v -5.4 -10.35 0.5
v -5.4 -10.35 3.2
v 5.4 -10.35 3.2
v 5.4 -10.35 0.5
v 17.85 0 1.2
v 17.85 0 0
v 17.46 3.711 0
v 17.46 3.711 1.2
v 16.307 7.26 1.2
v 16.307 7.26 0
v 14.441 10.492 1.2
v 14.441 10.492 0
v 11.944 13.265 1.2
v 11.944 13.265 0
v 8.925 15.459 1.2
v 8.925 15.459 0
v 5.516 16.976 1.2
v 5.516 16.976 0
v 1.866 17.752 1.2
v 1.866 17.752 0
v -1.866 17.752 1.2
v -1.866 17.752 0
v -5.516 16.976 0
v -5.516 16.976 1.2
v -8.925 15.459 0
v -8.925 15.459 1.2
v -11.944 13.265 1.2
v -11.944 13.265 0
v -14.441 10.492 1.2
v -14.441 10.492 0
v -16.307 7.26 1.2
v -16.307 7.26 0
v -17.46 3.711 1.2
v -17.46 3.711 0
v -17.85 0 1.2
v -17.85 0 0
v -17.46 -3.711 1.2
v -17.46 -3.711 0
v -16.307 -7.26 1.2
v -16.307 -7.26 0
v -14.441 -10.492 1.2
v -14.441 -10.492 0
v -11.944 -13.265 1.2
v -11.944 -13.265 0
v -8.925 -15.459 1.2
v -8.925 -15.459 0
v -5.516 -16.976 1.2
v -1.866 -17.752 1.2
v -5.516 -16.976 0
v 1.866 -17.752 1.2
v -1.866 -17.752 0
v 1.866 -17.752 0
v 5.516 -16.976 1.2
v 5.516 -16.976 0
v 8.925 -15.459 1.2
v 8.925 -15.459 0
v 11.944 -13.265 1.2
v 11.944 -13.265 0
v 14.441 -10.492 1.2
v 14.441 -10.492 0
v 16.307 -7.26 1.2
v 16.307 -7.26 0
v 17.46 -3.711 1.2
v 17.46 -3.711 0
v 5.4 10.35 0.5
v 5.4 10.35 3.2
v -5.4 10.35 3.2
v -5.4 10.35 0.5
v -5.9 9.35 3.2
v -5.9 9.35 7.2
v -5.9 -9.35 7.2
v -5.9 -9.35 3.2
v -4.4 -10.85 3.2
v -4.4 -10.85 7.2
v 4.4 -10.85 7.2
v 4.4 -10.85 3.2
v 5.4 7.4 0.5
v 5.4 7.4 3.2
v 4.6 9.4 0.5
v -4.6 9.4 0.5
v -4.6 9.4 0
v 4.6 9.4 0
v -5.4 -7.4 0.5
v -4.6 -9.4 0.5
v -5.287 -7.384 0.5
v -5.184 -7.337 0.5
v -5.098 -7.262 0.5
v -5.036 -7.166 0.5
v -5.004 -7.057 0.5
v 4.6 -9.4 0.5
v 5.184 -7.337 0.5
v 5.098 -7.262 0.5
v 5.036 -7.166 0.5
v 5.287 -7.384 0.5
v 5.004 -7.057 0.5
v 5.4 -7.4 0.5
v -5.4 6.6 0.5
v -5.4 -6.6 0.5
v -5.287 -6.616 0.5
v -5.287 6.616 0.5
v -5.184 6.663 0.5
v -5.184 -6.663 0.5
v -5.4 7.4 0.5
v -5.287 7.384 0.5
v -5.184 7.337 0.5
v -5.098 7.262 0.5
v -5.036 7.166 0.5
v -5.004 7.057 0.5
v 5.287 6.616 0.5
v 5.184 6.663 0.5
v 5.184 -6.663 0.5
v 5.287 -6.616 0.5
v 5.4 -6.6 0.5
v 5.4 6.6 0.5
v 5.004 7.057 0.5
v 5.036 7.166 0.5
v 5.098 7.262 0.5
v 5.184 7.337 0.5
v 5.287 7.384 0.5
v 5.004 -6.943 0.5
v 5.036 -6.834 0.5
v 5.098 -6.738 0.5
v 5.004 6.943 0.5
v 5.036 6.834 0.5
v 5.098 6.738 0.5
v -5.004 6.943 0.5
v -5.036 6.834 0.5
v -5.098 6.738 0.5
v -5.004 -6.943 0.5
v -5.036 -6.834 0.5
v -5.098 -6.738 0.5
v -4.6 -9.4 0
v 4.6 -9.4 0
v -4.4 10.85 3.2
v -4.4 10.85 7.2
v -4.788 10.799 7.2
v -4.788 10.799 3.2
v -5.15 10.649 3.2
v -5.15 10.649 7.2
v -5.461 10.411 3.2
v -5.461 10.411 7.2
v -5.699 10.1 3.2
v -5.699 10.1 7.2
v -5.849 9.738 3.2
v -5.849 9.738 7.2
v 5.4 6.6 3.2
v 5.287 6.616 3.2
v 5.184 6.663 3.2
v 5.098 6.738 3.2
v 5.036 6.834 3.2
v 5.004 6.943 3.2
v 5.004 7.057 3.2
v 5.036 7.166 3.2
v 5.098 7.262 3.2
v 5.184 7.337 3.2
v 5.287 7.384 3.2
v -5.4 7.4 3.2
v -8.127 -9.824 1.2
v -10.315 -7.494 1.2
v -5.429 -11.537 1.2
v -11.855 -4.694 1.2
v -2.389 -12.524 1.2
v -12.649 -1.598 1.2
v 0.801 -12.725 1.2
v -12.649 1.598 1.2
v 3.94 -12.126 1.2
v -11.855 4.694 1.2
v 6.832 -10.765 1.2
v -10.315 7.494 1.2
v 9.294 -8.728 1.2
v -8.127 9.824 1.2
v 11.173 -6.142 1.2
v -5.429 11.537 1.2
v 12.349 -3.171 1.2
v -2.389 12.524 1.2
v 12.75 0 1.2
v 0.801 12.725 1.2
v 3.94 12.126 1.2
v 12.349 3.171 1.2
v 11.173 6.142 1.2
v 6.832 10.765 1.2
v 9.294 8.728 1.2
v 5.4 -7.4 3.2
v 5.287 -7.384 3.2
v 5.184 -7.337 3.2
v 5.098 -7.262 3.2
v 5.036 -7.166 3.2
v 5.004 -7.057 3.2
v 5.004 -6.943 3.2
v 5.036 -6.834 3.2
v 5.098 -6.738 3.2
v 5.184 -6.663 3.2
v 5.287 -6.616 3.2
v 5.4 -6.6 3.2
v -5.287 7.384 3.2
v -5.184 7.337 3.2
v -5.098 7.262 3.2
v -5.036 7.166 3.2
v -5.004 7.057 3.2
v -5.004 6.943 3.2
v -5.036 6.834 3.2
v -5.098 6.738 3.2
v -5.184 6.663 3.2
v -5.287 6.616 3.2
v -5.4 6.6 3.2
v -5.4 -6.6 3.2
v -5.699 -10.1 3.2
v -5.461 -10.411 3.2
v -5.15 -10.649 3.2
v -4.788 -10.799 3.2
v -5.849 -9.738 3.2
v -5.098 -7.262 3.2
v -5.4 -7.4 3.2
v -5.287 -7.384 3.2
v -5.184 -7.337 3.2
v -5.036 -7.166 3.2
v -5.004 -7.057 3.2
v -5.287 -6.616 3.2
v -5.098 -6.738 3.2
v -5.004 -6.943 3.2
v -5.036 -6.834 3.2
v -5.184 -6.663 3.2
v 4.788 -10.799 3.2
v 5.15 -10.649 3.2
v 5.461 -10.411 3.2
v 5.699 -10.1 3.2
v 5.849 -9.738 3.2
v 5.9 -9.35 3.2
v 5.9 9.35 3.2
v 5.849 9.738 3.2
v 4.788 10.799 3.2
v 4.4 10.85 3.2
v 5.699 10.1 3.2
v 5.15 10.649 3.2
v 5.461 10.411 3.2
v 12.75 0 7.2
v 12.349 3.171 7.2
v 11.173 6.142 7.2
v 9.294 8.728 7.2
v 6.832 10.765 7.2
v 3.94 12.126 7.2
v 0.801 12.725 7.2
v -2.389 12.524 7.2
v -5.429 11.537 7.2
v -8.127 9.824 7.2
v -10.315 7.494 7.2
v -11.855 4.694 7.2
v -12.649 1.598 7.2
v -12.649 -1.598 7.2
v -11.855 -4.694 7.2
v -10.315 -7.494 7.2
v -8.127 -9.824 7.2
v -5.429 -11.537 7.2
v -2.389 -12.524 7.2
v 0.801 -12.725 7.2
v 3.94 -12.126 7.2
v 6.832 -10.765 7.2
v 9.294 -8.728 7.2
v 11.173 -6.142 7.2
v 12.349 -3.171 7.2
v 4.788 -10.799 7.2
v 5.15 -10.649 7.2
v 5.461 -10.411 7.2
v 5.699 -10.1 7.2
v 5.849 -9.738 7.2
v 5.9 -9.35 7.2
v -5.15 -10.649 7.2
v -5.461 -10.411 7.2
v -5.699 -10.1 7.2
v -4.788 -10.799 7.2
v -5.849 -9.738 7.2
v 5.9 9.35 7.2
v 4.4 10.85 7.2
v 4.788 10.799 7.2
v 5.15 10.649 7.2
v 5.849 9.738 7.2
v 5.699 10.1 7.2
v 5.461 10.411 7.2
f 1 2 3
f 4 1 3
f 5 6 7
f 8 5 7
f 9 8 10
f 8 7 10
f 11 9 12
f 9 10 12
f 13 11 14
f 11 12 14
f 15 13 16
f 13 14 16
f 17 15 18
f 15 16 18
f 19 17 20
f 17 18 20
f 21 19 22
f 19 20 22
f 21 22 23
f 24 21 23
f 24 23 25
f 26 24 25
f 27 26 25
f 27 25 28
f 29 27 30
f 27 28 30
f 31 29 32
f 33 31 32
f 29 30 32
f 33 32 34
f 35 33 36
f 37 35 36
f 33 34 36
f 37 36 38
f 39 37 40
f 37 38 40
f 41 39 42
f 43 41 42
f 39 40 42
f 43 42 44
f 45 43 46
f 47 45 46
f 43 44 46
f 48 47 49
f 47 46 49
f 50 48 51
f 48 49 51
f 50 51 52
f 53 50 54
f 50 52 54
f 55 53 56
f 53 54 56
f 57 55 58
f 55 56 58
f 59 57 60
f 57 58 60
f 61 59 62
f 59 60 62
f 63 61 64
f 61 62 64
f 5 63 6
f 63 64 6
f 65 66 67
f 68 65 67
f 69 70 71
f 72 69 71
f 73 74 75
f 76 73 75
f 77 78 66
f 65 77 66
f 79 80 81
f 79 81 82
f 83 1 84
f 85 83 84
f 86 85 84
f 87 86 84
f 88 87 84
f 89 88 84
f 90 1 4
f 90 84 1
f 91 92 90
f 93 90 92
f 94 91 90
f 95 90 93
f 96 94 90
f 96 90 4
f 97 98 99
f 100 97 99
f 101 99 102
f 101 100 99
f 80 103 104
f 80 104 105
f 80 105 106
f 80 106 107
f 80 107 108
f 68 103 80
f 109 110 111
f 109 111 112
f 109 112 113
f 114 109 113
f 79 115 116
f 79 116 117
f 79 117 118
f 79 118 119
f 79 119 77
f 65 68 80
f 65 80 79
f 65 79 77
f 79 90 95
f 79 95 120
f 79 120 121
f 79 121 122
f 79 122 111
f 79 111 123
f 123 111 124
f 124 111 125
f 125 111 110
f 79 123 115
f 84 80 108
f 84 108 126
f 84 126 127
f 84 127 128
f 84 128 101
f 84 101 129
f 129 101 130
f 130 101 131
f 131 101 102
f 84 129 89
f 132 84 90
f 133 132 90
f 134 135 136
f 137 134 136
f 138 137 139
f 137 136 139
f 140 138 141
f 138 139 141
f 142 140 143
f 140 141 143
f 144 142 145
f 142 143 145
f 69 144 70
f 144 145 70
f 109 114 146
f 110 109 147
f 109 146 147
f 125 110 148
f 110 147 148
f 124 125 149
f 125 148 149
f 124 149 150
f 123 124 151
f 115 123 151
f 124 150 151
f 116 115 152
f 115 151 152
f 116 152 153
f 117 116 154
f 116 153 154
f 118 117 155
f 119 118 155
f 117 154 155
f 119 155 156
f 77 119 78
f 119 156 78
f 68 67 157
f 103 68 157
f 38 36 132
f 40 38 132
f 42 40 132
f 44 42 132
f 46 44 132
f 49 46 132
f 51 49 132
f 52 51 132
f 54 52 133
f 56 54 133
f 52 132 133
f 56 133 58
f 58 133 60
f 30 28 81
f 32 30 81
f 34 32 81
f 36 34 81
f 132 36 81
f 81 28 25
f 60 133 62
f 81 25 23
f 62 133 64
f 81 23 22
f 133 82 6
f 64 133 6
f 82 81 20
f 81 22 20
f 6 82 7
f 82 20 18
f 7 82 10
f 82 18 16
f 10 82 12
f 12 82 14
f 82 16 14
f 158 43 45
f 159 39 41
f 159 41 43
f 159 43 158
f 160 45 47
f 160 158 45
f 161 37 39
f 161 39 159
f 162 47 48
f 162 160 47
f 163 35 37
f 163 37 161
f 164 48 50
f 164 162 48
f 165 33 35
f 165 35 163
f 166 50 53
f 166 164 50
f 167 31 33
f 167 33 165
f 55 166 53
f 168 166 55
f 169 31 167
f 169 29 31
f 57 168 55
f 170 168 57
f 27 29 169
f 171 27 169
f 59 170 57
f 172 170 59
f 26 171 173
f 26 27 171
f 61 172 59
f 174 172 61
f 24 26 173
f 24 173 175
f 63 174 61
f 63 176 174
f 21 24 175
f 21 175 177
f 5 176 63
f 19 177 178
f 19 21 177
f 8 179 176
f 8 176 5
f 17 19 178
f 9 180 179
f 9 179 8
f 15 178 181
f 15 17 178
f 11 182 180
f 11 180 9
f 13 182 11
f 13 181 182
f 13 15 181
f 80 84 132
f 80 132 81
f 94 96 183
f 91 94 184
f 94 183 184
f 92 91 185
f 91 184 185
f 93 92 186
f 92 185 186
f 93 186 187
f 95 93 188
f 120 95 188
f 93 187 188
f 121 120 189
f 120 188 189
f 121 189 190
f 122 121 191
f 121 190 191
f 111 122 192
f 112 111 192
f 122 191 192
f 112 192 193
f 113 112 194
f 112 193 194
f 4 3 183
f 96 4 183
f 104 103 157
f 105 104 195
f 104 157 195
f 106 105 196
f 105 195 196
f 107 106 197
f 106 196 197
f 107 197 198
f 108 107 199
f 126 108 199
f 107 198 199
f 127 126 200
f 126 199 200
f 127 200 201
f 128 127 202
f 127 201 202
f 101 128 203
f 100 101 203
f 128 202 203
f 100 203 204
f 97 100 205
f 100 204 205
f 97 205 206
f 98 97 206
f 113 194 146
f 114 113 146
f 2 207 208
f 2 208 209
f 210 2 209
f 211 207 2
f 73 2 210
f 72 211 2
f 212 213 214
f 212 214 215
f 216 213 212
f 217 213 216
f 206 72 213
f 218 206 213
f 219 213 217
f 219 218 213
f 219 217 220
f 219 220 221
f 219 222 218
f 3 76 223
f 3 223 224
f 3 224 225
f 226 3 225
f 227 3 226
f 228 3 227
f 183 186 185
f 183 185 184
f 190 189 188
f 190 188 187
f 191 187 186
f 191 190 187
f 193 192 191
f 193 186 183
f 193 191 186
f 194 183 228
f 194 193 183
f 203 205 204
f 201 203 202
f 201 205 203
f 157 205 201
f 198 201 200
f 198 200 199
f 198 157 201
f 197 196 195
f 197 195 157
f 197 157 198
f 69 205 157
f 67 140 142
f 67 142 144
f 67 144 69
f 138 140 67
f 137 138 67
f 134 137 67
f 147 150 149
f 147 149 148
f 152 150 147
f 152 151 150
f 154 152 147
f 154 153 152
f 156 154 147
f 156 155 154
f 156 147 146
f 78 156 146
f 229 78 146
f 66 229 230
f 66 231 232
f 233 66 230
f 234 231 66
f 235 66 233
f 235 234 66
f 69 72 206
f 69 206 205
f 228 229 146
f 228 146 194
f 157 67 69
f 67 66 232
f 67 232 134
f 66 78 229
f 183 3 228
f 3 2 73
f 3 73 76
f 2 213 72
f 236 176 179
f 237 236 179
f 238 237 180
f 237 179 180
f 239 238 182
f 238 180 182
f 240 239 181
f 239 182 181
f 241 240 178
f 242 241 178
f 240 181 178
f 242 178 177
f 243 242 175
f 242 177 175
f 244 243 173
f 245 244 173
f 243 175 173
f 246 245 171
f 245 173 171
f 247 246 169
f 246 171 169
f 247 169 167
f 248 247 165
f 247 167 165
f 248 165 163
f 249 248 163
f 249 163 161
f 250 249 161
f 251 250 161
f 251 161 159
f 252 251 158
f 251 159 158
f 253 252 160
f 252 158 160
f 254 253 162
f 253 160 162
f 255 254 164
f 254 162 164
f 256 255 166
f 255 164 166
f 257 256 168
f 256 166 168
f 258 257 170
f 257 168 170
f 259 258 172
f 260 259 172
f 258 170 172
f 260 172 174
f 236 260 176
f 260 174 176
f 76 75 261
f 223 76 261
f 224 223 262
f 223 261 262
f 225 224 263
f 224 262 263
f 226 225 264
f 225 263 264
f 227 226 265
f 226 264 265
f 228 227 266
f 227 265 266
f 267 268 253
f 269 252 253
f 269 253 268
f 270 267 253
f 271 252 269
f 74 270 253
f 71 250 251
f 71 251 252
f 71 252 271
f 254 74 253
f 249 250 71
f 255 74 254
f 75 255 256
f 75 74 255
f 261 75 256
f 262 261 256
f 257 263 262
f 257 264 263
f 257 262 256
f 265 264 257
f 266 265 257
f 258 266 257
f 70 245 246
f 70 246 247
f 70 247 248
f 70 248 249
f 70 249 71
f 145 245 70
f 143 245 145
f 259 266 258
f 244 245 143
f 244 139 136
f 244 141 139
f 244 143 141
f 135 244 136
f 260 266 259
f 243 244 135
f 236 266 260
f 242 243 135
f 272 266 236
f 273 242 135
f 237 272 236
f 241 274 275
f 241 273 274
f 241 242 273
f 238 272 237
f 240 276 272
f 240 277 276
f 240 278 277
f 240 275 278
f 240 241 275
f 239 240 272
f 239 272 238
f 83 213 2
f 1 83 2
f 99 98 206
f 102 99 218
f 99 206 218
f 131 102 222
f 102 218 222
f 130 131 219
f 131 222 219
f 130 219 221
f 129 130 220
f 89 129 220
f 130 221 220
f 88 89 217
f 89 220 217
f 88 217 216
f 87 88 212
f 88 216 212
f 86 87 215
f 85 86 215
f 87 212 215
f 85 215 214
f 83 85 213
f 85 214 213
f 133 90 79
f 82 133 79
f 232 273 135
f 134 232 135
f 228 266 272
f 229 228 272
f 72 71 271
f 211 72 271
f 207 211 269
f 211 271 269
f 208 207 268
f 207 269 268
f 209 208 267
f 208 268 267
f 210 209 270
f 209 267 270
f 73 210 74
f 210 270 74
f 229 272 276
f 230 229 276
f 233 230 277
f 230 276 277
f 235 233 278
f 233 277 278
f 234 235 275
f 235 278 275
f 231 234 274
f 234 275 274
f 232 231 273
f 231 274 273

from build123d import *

# Parameters (mm, degrees)
F0_R     = 17.85
F1_DEPTH = 1.2
F2_R     = 12.75
F3_DEPTH = 6
F4_W     = 9.2
F4_H     = 18.8
F5_DEPTH = 7.201
F7_DEPTH = 6.7
F9_DEPTH = 4


with BuildPart() as f1:
    # F0 (on Top) → F1 (new body)
    with BuildSketch(Plane.XY):
        Circle(F0_R)
    extrude(amount=F1_DEPTH)

    # F2 (on face) → F3 (join)
    with BuildSketch(Plane.XY.offset(1.2)):
        Circle(F2_R)
    extrude(amount=F3_DEPTH)

    # F4 (on face) → F5 (cut, through all)
    with BuildSketch(Plane.XY.offset(7.2)):
        Rectangle(F4_W, F4_H)
    extrude(amount=-F5_DEPTH, mode=Mode.SUBTRACT)

    # F6 (on face) → F7 (cut)
    with BuildSketch(Plane.XY.offset(7.2)):
        with BuildLine():
            Line((5.4, 10.35), (-5.4, 10.35))
            Line((-5.4, 10.35), (-5.4, 7.4))
            ThreePointArc((-5.4, 7.4), (-5, 7), (-5.4, 6.6))
            Line((-5.4, 6.6), (-5.4, -6.6))
            ThreePointArc((-5.4, -6.6), (-5, -7), (-5.4, -7.4))
            Line((-5.4, -7.4), (-5.4, -10.35))
            Line((-5.4, -10.35), (5.4, -10.35))
            Line((5.4, -10.35), (5.4, -7.4))
            ThreePointArc((5.4, -7.4), (5, -7), (5.4, -6.6))
            Line((5.4, -6.6), (5.4, 6.6))
            ThreePointArc((5.4, 6.6), (5, 7), (5.4, 7.4))
            Line((5.4, 7.4), (5.4, 10.35))
        make_face()
    extrude(amount=-F7_DEPTH, mode=Mode.SUBTRACT)

    # F8 (on face) → F9 (cut)
    with BuildSketch(Plane.XY.offset(7.2)):
        with BuildLine():
            Line((4.4, 10.85), (-4.4, 10.85))
            ThreePointArc((-4.4, 10.85), (-5.46066, 10.41066), (-5.9, 9.35))
            Line((-5.9, 9.35), (-5.9, -9.35))
            ThreePointArc((-5.9, -9.35), (-5.46066, -10.41066), (-4.4, -10.85))
            Line((-4.4, -10.85), (4.4, -10.85))
            ThreePointArc((4.4, -10.85), (5.46066, -10.41066), (5.9, -9.35))
            Line((5.9, -9.35), (5.9, 9.35))
            ThreePointArc((5.9, 9.35), (5.46066, 10.41066), (4.4, 10.85))
        make_face()
    extrude(amount=-F9_DEPTH, mode=Mode.SUBTRACT)


solid = f1.part
